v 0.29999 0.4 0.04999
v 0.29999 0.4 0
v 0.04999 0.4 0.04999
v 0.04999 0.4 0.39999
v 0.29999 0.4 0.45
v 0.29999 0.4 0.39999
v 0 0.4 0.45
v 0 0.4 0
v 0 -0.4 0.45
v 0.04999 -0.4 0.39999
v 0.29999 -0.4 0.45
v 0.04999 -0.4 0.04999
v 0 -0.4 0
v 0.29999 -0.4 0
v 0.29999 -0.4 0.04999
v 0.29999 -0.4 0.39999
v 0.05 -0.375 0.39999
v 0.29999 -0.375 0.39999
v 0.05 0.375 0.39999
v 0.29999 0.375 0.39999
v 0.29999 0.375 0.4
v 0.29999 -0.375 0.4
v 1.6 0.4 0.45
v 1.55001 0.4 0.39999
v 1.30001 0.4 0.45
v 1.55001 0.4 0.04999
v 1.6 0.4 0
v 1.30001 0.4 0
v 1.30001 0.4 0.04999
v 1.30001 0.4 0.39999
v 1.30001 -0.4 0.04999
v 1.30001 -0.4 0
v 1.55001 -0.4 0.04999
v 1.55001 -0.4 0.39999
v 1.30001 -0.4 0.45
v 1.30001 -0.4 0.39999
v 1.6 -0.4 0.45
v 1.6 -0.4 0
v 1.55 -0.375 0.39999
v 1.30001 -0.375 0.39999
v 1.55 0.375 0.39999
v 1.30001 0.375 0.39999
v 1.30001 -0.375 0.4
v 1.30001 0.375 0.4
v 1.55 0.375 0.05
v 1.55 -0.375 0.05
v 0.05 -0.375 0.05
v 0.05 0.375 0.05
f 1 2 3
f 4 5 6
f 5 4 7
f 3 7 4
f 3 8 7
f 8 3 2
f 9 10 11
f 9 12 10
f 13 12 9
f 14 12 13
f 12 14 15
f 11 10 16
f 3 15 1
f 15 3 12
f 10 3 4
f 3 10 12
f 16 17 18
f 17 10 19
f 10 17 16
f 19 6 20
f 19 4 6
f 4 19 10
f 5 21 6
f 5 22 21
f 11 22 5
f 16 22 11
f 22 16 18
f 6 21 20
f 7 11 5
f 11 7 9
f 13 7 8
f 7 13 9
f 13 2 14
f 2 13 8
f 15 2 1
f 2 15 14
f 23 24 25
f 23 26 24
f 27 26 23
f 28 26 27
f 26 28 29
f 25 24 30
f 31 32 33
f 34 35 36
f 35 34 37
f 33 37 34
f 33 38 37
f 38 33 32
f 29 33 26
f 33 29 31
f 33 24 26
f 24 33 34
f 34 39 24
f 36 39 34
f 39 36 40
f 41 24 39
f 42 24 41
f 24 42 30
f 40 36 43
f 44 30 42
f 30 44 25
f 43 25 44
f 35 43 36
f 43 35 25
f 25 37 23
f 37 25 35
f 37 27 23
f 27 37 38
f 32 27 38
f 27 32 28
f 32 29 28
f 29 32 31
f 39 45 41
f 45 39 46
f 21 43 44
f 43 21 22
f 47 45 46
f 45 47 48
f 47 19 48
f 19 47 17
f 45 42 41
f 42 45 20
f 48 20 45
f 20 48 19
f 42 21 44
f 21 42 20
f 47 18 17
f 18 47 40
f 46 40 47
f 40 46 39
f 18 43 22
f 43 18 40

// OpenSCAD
// Can be 00105,0201,0402,0603,0805,1206,1210,2010 or 2512
type="0603";

th = 0.05;

th = type=="00105" ? 0.02:
    type=="0201" ? 0.03:
    type=="0402" ? 0.04: 0.05;

l = type=="00105" ? 0.4:
    type=="0201" ? 0.6:
    type=="0402" ? 1.0:
    type=="0603" ? 1.6:
    type=="0805" ? 2.0 :
	type=="1206" ? 3.1:
	type=="1210" ? 3.2:
	type=="2010" ? 5.0:
	type=="2512" ? 6.35: 0;

w = type=="00105" ? 0.2:
    type=="0201" ? 0.3:
    type=="0402" ? 0.5:
    type=="0603" ? 0.8:
    type=="0805" ? 1.25 :
	type=="1206" ? 1.55:
	type=="1210" ? 2.6:
	type=="2010" ? 2.5:
	type=="2512" ? 3.2: 0;

t = type=="00105" ? 0.13:
    type=="0201" ? 0.23:
    type=="0402" ? 0.35:
    type=="0603" ? 0.45:
    type=="0805" ? 0.5 :
	type=="1206" ? 0.55:
	type=="1210" ? 0.55:
	type=="2010" ? 0.55:
	type=="2512" ? 0.55: 0;

d1 = type=="00105" ? 0.1:
    type=="0201" ? 0.15:
    type=="0402" ? 0.20:
    type=="0603" ? 0.30:
    type=="0805" ? 0.35:
	type=="1206" ? 0.50:
	type=="1210" ? 0.50:
	type=="2010" ? 0.60:
	type=="2512" ? 0.60: 0;

d2 = type=="00105" ? 0.1:
    type=="0201" ? 0.15:
    type=="0402" ? 0.20:
    type=="0603" ? 0.30:
    type=="0805" ? 0.40:
	type=="1206" ? 0.50:
	type=="1210" ? 0.50:
	type=="2010" ? 0.50:
	type=="2512" ? 0.50: 0;

module pin()
{
	rotate([90,0,0])
		linear_extrude(height = w, center = true, convexity = 10, twist = 0)
			polygon([[0,0],[d2,0],[d2,th],[th,th],[th,t-th],[d1,t-th],[d1,t],[0,t]]);
}


pin();
translate([l,0,0])
mirror([1,0,0])
pin();

translate([th,-(w-th)/2,th])
cube([l-th*2,w-th,t-th*2]);
